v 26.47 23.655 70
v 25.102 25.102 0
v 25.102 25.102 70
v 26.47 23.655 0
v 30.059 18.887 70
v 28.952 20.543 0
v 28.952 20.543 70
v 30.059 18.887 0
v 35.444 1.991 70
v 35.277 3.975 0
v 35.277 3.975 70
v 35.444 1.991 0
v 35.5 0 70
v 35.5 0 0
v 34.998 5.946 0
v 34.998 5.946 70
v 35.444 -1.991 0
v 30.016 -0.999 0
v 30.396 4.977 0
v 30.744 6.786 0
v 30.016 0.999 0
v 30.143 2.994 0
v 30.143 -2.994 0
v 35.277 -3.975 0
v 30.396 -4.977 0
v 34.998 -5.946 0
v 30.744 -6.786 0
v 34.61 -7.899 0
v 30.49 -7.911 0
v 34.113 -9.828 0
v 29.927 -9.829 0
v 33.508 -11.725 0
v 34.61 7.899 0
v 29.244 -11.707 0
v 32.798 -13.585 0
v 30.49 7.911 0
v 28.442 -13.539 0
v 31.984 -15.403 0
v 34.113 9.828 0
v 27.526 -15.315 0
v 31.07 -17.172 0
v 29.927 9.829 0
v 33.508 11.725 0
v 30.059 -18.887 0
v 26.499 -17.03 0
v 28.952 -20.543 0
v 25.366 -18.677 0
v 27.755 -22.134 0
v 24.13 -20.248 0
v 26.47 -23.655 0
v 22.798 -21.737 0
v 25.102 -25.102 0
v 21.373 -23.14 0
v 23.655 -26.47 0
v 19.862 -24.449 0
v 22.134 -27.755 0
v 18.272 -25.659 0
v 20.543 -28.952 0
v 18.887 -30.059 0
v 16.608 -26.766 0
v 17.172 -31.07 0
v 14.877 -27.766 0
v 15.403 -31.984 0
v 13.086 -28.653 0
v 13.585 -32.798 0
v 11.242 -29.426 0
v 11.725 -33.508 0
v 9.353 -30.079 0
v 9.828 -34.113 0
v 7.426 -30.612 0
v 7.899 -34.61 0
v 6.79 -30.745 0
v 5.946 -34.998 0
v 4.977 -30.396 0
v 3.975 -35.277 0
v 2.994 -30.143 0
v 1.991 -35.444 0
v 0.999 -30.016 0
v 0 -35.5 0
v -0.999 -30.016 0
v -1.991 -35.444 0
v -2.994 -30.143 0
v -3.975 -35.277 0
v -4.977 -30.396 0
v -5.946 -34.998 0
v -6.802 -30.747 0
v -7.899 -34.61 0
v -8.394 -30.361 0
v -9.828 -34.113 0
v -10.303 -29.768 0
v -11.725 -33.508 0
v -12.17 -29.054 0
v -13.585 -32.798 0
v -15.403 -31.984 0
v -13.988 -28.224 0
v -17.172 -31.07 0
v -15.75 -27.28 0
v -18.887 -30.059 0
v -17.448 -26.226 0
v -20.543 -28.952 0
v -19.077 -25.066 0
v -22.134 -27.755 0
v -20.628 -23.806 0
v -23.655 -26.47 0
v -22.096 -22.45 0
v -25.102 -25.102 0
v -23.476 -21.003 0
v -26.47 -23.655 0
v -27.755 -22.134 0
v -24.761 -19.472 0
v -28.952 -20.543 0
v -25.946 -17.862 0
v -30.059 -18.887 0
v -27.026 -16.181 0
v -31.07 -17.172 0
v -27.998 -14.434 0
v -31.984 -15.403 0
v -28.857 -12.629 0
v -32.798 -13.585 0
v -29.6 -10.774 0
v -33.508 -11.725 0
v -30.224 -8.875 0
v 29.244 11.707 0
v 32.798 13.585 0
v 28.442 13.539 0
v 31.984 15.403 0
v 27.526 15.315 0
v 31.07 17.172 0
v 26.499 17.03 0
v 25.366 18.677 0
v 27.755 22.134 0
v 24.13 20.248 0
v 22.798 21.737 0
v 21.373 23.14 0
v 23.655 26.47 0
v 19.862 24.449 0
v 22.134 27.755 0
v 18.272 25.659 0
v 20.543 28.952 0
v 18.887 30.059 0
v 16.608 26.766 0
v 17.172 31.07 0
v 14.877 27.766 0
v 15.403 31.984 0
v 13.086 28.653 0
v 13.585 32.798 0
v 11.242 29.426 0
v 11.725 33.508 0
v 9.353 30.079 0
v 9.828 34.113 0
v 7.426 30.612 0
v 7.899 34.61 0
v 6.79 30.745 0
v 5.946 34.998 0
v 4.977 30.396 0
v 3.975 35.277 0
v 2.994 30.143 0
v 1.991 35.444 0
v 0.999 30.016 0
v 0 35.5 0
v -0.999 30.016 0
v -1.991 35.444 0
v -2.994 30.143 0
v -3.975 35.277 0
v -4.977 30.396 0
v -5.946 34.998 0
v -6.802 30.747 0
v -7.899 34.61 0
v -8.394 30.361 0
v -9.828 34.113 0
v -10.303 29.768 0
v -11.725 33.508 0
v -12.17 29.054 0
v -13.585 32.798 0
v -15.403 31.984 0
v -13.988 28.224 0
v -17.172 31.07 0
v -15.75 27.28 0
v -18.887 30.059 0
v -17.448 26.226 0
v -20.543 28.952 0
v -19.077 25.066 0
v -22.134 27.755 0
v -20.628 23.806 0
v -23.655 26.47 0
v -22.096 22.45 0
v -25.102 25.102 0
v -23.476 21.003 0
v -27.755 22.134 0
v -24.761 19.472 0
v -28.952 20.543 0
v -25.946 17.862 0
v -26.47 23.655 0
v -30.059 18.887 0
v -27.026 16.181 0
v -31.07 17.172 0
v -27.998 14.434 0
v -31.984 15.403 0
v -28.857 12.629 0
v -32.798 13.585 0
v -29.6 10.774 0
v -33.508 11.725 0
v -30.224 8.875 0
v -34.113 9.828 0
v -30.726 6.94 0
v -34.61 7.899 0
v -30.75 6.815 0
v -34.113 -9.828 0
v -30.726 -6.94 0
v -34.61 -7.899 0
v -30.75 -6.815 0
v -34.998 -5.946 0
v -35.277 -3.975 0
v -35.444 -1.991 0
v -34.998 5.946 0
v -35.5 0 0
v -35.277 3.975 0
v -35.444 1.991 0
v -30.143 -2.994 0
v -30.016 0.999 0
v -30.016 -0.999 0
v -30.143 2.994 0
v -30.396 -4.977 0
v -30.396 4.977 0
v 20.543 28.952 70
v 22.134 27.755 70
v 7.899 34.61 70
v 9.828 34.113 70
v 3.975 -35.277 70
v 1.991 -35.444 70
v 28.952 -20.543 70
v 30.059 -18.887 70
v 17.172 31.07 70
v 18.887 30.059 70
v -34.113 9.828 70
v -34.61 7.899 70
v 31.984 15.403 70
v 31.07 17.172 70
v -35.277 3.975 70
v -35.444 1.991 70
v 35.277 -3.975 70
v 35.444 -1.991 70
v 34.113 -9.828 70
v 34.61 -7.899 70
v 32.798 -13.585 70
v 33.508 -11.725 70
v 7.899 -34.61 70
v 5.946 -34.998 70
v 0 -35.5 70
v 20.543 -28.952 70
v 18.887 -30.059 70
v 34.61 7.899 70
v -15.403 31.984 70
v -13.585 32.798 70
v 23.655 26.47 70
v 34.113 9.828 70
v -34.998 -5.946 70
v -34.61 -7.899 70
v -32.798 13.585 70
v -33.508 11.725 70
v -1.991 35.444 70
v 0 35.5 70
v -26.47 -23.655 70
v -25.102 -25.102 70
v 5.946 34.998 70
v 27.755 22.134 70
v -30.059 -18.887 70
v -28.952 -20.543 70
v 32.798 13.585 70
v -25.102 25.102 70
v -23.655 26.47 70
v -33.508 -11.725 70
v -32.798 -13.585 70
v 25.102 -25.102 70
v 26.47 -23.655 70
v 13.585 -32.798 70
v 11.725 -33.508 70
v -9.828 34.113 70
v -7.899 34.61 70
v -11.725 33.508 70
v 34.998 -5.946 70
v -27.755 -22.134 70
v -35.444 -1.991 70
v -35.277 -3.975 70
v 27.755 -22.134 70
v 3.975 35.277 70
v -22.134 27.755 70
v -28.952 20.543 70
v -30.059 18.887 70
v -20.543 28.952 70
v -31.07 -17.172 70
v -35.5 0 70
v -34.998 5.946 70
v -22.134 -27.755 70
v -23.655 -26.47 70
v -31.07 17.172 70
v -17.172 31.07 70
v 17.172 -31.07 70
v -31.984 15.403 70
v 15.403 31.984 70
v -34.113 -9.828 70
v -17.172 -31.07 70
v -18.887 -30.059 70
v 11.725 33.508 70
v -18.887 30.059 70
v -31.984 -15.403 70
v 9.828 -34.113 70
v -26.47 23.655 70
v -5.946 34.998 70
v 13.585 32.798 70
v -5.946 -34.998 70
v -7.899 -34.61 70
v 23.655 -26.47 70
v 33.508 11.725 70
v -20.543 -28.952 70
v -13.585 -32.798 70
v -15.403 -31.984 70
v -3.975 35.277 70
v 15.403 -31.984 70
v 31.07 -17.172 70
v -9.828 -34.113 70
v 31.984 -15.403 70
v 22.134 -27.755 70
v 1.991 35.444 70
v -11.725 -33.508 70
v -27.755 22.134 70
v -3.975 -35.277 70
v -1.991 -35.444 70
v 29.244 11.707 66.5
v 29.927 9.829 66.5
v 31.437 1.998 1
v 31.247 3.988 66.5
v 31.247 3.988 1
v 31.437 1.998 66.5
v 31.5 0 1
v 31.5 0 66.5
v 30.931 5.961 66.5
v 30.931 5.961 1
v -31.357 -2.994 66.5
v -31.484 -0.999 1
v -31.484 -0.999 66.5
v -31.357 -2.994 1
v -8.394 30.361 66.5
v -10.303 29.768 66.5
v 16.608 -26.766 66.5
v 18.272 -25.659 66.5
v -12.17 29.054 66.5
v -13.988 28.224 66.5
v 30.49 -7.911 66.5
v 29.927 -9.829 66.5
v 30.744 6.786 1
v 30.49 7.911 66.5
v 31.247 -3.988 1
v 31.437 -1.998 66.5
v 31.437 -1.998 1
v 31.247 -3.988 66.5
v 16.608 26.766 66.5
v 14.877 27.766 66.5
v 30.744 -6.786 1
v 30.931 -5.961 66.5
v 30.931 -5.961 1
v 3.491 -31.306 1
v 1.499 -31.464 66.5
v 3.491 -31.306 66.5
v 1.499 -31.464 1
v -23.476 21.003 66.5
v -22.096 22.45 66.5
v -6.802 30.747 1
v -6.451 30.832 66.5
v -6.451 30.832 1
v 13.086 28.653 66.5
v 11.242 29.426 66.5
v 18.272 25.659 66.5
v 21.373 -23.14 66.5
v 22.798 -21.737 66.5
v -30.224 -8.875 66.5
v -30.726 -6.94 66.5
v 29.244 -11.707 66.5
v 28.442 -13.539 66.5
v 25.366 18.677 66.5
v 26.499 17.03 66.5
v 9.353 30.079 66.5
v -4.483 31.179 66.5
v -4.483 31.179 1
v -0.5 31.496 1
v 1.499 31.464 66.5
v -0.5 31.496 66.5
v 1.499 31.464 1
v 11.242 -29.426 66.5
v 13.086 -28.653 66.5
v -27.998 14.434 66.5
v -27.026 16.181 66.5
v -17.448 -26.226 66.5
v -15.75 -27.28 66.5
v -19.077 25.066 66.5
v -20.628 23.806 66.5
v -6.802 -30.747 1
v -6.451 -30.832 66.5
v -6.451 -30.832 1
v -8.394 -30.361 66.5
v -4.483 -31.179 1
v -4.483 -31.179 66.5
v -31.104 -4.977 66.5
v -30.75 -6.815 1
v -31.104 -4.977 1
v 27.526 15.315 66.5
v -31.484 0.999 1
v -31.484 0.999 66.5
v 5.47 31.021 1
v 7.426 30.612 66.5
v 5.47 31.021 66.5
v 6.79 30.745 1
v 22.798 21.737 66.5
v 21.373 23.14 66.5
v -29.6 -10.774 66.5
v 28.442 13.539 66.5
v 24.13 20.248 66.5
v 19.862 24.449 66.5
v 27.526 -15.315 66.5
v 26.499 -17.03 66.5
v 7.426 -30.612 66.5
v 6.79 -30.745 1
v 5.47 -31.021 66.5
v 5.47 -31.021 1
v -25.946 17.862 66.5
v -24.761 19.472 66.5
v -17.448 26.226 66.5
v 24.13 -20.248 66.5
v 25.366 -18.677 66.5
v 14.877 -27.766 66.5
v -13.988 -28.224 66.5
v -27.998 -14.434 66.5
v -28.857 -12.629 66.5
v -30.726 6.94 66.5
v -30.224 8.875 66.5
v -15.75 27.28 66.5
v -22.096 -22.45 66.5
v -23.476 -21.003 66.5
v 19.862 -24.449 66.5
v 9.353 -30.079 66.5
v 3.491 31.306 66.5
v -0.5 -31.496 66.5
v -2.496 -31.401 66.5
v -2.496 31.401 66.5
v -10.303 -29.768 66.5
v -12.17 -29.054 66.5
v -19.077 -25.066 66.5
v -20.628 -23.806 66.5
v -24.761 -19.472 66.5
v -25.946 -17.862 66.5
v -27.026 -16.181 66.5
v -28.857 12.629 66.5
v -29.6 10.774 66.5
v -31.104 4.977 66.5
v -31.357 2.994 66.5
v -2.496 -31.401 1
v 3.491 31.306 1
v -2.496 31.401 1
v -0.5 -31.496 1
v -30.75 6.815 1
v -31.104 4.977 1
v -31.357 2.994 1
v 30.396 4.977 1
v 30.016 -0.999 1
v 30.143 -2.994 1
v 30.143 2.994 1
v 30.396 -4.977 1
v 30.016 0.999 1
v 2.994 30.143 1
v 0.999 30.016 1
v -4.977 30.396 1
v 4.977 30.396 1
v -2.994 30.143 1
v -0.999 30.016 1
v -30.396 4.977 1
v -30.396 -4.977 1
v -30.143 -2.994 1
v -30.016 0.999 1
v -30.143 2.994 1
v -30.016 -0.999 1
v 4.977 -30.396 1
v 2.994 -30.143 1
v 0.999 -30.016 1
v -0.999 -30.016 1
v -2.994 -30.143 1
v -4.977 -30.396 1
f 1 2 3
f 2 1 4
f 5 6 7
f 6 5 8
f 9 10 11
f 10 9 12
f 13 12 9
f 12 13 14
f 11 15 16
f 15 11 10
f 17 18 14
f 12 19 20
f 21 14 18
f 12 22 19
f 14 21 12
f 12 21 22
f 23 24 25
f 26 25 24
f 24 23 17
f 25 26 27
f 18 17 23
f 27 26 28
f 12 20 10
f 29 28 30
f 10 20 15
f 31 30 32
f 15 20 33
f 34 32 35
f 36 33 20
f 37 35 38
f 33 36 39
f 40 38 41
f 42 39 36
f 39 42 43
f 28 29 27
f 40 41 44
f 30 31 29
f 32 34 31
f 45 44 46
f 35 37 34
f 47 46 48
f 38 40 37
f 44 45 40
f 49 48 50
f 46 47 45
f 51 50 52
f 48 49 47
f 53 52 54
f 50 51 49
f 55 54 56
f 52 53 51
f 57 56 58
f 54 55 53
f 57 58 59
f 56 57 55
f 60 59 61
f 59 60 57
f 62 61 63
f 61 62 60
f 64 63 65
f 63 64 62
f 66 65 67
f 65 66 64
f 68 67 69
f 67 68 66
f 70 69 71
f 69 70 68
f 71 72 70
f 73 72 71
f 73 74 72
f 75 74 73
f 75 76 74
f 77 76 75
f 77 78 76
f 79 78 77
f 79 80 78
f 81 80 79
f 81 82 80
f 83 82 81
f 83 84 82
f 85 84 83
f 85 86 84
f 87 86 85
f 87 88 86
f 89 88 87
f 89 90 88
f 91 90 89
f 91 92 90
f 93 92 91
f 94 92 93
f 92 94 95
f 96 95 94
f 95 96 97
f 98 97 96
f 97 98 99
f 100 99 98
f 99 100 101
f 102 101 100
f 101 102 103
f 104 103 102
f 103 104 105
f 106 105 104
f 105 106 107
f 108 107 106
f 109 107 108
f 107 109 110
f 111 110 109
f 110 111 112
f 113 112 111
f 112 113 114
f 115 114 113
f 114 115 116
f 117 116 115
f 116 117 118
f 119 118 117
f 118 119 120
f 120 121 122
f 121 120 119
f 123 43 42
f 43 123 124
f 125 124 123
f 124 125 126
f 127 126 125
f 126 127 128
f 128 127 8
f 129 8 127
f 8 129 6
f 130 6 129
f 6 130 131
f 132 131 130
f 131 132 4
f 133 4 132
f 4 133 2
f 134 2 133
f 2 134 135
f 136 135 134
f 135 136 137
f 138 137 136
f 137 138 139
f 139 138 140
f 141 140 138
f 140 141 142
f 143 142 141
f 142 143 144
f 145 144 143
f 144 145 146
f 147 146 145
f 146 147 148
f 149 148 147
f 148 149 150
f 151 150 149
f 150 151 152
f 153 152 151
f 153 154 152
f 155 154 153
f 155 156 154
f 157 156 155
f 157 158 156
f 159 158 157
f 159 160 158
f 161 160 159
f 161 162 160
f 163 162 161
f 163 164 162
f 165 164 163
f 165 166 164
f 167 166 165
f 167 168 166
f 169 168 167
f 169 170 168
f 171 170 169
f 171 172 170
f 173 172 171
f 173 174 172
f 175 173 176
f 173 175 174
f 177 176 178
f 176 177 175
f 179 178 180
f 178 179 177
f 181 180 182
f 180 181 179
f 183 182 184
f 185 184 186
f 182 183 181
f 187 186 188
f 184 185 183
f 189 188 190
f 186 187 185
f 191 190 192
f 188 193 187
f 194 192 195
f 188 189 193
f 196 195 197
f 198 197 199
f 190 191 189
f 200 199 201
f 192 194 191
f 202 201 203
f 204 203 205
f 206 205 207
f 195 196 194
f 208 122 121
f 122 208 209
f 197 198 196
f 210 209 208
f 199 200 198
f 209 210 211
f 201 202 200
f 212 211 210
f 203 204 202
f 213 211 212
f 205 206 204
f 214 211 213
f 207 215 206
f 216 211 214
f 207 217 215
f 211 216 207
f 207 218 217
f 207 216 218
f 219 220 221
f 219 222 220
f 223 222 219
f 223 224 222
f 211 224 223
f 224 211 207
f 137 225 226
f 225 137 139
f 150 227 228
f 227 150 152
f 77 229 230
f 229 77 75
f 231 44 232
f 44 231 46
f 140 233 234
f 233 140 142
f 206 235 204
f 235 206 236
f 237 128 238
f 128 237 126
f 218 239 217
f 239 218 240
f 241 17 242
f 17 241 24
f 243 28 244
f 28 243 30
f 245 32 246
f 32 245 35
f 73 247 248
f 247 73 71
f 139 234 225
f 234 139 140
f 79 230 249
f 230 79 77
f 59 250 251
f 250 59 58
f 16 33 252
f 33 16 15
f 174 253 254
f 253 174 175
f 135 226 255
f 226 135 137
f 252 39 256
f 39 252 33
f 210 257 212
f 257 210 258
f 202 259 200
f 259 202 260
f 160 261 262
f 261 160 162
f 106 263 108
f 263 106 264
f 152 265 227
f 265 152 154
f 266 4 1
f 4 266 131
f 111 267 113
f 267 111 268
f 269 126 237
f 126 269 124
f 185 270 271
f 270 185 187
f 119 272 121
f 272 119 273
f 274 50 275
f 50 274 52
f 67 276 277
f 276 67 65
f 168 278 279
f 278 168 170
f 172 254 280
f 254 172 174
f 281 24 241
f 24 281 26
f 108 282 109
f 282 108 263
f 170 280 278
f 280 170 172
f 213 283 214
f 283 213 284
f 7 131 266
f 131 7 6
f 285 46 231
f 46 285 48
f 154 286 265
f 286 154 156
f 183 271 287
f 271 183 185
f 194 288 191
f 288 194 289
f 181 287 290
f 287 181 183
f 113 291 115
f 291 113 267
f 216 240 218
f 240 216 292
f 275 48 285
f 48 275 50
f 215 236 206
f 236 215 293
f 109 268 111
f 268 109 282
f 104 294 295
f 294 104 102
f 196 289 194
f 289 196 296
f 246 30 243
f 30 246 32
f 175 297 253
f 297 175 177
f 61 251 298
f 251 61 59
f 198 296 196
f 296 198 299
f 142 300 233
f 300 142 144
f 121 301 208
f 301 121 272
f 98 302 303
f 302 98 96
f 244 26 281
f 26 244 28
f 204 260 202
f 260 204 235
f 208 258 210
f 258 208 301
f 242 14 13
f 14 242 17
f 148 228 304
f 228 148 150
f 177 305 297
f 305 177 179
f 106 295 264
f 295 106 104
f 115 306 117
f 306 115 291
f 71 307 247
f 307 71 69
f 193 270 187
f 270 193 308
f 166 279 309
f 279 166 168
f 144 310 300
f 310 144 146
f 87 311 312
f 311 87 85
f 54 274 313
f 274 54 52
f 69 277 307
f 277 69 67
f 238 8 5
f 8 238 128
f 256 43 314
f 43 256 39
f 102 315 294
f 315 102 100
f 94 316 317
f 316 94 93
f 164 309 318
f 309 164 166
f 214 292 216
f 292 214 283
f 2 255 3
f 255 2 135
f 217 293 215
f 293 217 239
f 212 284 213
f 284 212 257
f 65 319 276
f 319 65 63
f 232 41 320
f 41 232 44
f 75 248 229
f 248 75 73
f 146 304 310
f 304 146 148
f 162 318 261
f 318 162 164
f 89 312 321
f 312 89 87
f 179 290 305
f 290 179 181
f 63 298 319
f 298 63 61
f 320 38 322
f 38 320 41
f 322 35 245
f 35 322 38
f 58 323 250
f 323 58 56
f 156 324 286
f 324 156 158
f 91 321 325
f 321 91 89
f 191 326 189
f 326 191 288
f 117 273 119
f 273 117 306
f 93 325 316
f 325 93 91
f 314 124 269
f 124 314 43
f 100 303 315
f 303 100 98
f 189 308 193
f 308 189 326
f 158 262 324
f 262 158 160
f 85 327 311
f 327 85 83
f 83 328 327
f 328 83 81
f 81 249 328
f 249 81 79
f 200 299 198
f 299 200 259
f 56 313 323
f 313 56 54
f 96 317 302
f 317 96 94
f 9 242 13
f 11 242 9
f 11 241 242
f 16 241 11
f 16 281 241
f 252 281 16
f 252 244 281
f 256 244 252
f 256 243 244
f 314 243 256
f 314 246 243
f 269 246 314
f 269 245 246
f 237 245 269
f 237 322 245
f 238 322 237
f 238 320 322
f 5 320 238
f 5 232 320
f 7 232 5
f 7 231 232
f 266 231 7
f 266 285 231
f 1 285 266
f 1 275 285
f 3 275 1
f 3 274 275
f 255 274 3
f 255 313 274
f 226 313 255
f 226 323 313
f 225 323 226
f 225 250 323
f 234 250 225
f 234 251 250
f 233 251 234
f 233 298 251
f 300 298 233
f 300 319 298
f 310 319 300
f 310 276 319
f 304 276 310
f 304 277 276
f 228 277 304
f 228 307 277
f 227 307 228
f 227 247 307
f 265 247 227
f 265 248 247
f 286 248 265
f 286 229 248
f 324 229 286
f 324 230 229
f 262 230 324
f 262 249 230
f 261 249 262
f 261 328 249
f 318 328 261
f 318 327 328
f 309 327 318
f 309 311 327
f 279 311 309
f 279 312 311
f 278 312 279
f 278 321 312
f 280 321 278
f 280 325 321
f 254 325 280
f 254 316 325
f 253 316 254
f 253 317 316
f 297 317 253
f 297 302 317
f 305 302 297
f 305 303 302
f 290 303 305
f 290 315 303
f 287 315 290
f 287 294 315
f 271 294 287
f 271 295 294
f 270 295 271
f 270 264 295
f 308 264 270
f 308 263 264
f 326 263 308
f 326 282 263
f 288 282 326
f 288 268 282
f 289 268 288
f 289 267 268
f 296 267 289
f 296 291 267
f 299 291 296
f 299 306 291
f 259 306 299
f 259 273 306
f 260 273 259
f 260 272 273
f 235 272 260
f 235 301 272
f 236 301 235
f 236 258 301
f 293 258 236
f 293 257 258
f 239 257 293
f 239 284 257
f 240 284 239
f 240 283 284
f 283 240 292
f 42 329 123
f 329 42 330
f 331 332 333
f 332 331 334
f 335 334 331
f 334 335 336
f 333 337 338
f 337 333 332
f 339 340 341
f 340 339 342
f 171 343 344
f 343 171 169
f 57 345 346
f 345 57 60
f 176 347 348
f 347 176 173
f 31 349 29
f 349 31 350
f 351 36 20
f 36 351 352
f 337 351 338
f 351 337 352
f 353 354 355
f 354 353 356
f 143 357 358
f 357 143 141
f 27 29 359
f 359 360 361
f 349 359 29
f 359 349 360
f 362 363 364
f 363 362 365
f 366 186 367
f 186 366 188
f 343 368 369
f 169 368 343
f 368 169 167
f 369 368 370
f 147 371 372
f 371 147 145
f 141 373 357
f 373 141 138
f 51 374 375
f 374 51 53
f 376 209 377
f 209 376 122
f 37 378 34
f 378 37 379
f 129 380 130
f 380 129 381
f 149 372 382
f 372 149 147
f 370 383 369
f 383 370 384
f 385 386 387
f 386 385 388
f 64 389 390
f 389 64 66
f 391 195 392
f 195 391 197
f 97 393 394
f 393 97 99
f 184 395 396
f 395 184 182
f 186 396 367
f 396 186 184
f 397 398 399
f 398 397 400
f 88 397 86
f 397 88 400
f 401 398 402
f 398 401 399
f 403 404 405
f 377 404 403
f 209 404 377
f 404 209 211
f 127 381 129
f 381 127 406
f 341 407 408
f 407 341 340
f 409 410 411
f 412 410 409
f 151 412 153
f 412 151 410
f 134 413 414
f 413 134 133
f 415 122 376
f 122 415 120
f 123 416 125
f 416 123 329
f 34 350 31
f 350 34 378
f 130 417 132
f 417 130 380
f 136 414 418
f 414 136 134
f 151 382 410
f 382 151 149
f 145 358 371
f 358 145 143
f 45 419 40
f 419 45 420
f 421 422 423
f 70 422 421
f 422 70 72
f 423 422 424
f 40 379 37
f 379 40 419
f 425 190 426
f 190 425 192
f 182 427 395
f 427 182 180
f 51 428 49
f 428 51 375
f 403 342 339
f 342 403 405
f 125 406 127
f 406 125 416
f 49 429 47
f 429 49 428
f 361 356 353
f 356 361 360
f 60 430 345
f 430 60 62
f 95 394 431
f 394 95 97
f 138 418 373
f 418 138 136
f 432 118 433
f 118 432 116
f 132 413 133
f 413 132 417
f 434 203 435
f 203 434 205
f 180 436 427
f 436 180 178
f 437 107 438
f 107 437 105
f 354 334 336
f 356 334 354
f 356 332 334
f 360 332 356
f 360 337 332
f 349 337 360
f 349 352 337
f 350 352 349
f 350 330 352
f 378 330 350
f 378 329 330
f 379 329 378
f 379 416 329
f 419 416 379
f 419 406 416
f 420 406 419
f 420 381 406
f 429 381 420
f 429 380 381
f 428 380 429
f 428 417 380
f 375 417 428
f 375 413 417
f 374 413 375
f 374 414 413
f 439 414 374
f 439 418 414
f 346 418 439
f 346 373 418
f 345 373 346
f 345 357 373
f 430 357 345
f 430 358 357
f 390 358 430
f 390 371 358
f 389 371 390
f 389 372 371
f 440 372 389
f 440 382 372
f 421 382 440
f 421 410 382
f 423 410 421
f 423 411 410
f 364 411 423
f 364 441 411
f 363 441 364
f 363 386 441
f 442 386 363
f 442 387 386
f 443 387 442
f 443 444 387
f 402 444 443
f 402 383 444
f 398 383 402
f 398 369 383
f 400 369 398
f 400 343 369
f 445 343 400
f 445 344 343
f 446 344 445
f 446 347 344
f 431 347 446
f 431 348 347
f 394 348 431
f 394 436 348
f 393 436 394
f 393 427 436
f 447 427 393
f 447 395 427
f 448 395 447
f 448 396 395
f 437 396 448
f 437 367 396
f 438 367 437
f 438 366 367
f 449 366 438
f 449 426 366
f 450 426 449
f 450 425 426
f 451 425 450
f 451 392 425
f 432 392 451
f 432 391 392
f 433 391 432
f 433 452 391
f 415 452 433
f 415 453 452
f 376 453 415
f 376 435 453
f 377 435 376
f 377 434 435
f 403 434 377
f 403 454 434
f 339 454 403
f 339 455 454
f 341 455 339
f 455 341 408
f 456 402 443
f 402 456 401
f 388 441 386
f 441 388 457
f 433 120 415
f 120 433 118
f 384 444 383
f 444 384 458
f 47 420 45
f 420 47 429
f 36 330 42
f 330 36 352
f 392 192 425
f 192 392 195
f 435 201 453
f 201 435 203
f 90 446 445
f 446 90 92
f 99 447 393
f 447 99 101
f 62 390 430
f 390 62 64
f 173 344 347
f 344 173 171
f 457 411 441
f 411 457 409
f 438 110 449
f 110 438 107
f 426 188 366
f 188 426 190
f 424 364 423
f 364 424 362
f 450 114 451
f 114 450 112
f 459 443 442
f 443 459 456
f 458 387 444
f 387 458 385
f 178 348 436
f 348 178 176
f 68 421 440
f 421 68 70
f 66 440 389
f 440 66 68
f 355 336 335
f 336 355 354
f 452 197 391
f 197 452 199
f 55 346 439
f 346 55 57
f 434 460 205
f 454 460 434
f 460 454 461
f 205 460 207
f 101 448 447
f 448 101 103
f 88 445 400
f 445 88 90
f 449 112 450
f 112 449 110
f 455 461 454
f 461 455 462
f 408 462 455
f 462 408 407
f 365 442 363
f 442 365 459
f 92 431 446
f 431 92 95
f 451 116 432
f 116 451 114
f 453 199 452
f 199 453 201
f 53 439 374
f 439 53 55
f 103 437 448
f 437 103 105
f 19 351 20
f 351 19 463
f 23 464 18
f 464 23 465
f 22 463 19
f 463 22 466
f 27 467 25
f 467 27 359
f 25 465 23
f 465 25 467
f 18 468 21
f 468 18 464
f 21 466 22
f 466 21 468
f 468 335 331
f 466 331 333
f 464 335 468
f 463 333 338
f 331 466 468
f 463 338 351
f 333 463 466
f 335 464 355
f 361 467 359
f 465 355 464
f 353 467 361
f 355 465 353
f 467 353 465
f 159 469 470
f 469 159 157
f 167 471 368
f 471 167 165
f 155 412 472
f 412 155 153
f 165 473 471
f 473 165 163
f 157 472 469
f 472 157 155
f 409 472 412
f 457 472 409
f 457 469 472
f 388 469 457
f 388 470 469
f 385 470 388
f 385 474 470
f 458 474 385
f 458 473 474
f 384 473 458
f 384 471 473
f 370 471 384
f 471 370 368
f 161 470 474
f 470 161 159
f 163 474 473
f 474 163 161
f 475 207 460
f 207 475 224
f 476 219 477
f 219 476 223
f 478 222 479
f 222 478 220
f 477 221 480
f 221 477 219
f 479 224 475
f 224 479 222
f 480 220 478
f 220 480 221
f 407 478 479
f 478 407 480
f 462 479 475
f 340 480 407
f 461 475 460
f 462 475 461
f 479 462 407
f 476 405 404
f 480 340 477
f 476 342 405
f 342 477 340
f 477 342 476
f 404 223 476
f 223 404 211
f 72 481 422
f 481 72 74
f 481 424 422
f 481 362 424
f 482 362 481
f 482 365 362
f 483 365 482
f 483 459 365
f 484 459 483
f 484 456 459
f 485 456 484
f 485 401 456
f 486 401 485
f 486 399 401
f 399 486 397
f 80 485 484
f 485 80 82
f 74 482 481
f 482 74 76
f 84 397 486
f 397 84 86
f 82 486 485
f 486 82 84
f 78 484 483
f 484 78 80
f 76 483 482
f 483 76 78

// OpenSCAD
$fa = 2;


module internal(){
	translate([0,0,-.5]) cylinder(67,31.5,31.5,false);
}

module lips(){
	translate([61.5,0,0]) cylinder(1,31.5,31.5,false);
}


module jar(){

	 // MAIN 
	difference(){
		translate([0,0,0]) cylinder(70,35.5,35.5,false);
		internal();
	}


	// VIS LIPS
	intersection(){
		internal();
		union(){
		rotate([0,0,00]) lips();
		rotate([0,0,90]) lips();
		rotate([0,0,180]) lips();
		rotate([0,0,270]) lips();
		}
	}


	// 45 top lips 
	*difference(){
		translate([0,0,8]) cylinder(2,35.5,35.5,false);
		translate([0,0,7]) cylinder(4,33,29,false);
	}

	// 45 top lips 
	*difference(){
		translate([0,0,10]) cylinder(1,35.5,35.5,false);
		translate([0,0,9.5]) cylinder(2,30,30,false);
	}


	// MiniJar inclosure connector
	*difference(){
		translate([0,0,11]) cylinder(2,35.5,35.5,false);
		translate([0,0,10.5]) cylinder(3,30,30.5,false);
	}


	// MiniJar inclosure connector
	*difference(){
		translate([0,0,13]) cylinder(60,35.5,35.5,false);
		translate([0,0,12.5]) cylinder(56,30.5,30.5,false);
	}

}

jar();

*difference(){
	jar();
	translate([-150,0,-1]) cube([300,300,300]);
	
}
